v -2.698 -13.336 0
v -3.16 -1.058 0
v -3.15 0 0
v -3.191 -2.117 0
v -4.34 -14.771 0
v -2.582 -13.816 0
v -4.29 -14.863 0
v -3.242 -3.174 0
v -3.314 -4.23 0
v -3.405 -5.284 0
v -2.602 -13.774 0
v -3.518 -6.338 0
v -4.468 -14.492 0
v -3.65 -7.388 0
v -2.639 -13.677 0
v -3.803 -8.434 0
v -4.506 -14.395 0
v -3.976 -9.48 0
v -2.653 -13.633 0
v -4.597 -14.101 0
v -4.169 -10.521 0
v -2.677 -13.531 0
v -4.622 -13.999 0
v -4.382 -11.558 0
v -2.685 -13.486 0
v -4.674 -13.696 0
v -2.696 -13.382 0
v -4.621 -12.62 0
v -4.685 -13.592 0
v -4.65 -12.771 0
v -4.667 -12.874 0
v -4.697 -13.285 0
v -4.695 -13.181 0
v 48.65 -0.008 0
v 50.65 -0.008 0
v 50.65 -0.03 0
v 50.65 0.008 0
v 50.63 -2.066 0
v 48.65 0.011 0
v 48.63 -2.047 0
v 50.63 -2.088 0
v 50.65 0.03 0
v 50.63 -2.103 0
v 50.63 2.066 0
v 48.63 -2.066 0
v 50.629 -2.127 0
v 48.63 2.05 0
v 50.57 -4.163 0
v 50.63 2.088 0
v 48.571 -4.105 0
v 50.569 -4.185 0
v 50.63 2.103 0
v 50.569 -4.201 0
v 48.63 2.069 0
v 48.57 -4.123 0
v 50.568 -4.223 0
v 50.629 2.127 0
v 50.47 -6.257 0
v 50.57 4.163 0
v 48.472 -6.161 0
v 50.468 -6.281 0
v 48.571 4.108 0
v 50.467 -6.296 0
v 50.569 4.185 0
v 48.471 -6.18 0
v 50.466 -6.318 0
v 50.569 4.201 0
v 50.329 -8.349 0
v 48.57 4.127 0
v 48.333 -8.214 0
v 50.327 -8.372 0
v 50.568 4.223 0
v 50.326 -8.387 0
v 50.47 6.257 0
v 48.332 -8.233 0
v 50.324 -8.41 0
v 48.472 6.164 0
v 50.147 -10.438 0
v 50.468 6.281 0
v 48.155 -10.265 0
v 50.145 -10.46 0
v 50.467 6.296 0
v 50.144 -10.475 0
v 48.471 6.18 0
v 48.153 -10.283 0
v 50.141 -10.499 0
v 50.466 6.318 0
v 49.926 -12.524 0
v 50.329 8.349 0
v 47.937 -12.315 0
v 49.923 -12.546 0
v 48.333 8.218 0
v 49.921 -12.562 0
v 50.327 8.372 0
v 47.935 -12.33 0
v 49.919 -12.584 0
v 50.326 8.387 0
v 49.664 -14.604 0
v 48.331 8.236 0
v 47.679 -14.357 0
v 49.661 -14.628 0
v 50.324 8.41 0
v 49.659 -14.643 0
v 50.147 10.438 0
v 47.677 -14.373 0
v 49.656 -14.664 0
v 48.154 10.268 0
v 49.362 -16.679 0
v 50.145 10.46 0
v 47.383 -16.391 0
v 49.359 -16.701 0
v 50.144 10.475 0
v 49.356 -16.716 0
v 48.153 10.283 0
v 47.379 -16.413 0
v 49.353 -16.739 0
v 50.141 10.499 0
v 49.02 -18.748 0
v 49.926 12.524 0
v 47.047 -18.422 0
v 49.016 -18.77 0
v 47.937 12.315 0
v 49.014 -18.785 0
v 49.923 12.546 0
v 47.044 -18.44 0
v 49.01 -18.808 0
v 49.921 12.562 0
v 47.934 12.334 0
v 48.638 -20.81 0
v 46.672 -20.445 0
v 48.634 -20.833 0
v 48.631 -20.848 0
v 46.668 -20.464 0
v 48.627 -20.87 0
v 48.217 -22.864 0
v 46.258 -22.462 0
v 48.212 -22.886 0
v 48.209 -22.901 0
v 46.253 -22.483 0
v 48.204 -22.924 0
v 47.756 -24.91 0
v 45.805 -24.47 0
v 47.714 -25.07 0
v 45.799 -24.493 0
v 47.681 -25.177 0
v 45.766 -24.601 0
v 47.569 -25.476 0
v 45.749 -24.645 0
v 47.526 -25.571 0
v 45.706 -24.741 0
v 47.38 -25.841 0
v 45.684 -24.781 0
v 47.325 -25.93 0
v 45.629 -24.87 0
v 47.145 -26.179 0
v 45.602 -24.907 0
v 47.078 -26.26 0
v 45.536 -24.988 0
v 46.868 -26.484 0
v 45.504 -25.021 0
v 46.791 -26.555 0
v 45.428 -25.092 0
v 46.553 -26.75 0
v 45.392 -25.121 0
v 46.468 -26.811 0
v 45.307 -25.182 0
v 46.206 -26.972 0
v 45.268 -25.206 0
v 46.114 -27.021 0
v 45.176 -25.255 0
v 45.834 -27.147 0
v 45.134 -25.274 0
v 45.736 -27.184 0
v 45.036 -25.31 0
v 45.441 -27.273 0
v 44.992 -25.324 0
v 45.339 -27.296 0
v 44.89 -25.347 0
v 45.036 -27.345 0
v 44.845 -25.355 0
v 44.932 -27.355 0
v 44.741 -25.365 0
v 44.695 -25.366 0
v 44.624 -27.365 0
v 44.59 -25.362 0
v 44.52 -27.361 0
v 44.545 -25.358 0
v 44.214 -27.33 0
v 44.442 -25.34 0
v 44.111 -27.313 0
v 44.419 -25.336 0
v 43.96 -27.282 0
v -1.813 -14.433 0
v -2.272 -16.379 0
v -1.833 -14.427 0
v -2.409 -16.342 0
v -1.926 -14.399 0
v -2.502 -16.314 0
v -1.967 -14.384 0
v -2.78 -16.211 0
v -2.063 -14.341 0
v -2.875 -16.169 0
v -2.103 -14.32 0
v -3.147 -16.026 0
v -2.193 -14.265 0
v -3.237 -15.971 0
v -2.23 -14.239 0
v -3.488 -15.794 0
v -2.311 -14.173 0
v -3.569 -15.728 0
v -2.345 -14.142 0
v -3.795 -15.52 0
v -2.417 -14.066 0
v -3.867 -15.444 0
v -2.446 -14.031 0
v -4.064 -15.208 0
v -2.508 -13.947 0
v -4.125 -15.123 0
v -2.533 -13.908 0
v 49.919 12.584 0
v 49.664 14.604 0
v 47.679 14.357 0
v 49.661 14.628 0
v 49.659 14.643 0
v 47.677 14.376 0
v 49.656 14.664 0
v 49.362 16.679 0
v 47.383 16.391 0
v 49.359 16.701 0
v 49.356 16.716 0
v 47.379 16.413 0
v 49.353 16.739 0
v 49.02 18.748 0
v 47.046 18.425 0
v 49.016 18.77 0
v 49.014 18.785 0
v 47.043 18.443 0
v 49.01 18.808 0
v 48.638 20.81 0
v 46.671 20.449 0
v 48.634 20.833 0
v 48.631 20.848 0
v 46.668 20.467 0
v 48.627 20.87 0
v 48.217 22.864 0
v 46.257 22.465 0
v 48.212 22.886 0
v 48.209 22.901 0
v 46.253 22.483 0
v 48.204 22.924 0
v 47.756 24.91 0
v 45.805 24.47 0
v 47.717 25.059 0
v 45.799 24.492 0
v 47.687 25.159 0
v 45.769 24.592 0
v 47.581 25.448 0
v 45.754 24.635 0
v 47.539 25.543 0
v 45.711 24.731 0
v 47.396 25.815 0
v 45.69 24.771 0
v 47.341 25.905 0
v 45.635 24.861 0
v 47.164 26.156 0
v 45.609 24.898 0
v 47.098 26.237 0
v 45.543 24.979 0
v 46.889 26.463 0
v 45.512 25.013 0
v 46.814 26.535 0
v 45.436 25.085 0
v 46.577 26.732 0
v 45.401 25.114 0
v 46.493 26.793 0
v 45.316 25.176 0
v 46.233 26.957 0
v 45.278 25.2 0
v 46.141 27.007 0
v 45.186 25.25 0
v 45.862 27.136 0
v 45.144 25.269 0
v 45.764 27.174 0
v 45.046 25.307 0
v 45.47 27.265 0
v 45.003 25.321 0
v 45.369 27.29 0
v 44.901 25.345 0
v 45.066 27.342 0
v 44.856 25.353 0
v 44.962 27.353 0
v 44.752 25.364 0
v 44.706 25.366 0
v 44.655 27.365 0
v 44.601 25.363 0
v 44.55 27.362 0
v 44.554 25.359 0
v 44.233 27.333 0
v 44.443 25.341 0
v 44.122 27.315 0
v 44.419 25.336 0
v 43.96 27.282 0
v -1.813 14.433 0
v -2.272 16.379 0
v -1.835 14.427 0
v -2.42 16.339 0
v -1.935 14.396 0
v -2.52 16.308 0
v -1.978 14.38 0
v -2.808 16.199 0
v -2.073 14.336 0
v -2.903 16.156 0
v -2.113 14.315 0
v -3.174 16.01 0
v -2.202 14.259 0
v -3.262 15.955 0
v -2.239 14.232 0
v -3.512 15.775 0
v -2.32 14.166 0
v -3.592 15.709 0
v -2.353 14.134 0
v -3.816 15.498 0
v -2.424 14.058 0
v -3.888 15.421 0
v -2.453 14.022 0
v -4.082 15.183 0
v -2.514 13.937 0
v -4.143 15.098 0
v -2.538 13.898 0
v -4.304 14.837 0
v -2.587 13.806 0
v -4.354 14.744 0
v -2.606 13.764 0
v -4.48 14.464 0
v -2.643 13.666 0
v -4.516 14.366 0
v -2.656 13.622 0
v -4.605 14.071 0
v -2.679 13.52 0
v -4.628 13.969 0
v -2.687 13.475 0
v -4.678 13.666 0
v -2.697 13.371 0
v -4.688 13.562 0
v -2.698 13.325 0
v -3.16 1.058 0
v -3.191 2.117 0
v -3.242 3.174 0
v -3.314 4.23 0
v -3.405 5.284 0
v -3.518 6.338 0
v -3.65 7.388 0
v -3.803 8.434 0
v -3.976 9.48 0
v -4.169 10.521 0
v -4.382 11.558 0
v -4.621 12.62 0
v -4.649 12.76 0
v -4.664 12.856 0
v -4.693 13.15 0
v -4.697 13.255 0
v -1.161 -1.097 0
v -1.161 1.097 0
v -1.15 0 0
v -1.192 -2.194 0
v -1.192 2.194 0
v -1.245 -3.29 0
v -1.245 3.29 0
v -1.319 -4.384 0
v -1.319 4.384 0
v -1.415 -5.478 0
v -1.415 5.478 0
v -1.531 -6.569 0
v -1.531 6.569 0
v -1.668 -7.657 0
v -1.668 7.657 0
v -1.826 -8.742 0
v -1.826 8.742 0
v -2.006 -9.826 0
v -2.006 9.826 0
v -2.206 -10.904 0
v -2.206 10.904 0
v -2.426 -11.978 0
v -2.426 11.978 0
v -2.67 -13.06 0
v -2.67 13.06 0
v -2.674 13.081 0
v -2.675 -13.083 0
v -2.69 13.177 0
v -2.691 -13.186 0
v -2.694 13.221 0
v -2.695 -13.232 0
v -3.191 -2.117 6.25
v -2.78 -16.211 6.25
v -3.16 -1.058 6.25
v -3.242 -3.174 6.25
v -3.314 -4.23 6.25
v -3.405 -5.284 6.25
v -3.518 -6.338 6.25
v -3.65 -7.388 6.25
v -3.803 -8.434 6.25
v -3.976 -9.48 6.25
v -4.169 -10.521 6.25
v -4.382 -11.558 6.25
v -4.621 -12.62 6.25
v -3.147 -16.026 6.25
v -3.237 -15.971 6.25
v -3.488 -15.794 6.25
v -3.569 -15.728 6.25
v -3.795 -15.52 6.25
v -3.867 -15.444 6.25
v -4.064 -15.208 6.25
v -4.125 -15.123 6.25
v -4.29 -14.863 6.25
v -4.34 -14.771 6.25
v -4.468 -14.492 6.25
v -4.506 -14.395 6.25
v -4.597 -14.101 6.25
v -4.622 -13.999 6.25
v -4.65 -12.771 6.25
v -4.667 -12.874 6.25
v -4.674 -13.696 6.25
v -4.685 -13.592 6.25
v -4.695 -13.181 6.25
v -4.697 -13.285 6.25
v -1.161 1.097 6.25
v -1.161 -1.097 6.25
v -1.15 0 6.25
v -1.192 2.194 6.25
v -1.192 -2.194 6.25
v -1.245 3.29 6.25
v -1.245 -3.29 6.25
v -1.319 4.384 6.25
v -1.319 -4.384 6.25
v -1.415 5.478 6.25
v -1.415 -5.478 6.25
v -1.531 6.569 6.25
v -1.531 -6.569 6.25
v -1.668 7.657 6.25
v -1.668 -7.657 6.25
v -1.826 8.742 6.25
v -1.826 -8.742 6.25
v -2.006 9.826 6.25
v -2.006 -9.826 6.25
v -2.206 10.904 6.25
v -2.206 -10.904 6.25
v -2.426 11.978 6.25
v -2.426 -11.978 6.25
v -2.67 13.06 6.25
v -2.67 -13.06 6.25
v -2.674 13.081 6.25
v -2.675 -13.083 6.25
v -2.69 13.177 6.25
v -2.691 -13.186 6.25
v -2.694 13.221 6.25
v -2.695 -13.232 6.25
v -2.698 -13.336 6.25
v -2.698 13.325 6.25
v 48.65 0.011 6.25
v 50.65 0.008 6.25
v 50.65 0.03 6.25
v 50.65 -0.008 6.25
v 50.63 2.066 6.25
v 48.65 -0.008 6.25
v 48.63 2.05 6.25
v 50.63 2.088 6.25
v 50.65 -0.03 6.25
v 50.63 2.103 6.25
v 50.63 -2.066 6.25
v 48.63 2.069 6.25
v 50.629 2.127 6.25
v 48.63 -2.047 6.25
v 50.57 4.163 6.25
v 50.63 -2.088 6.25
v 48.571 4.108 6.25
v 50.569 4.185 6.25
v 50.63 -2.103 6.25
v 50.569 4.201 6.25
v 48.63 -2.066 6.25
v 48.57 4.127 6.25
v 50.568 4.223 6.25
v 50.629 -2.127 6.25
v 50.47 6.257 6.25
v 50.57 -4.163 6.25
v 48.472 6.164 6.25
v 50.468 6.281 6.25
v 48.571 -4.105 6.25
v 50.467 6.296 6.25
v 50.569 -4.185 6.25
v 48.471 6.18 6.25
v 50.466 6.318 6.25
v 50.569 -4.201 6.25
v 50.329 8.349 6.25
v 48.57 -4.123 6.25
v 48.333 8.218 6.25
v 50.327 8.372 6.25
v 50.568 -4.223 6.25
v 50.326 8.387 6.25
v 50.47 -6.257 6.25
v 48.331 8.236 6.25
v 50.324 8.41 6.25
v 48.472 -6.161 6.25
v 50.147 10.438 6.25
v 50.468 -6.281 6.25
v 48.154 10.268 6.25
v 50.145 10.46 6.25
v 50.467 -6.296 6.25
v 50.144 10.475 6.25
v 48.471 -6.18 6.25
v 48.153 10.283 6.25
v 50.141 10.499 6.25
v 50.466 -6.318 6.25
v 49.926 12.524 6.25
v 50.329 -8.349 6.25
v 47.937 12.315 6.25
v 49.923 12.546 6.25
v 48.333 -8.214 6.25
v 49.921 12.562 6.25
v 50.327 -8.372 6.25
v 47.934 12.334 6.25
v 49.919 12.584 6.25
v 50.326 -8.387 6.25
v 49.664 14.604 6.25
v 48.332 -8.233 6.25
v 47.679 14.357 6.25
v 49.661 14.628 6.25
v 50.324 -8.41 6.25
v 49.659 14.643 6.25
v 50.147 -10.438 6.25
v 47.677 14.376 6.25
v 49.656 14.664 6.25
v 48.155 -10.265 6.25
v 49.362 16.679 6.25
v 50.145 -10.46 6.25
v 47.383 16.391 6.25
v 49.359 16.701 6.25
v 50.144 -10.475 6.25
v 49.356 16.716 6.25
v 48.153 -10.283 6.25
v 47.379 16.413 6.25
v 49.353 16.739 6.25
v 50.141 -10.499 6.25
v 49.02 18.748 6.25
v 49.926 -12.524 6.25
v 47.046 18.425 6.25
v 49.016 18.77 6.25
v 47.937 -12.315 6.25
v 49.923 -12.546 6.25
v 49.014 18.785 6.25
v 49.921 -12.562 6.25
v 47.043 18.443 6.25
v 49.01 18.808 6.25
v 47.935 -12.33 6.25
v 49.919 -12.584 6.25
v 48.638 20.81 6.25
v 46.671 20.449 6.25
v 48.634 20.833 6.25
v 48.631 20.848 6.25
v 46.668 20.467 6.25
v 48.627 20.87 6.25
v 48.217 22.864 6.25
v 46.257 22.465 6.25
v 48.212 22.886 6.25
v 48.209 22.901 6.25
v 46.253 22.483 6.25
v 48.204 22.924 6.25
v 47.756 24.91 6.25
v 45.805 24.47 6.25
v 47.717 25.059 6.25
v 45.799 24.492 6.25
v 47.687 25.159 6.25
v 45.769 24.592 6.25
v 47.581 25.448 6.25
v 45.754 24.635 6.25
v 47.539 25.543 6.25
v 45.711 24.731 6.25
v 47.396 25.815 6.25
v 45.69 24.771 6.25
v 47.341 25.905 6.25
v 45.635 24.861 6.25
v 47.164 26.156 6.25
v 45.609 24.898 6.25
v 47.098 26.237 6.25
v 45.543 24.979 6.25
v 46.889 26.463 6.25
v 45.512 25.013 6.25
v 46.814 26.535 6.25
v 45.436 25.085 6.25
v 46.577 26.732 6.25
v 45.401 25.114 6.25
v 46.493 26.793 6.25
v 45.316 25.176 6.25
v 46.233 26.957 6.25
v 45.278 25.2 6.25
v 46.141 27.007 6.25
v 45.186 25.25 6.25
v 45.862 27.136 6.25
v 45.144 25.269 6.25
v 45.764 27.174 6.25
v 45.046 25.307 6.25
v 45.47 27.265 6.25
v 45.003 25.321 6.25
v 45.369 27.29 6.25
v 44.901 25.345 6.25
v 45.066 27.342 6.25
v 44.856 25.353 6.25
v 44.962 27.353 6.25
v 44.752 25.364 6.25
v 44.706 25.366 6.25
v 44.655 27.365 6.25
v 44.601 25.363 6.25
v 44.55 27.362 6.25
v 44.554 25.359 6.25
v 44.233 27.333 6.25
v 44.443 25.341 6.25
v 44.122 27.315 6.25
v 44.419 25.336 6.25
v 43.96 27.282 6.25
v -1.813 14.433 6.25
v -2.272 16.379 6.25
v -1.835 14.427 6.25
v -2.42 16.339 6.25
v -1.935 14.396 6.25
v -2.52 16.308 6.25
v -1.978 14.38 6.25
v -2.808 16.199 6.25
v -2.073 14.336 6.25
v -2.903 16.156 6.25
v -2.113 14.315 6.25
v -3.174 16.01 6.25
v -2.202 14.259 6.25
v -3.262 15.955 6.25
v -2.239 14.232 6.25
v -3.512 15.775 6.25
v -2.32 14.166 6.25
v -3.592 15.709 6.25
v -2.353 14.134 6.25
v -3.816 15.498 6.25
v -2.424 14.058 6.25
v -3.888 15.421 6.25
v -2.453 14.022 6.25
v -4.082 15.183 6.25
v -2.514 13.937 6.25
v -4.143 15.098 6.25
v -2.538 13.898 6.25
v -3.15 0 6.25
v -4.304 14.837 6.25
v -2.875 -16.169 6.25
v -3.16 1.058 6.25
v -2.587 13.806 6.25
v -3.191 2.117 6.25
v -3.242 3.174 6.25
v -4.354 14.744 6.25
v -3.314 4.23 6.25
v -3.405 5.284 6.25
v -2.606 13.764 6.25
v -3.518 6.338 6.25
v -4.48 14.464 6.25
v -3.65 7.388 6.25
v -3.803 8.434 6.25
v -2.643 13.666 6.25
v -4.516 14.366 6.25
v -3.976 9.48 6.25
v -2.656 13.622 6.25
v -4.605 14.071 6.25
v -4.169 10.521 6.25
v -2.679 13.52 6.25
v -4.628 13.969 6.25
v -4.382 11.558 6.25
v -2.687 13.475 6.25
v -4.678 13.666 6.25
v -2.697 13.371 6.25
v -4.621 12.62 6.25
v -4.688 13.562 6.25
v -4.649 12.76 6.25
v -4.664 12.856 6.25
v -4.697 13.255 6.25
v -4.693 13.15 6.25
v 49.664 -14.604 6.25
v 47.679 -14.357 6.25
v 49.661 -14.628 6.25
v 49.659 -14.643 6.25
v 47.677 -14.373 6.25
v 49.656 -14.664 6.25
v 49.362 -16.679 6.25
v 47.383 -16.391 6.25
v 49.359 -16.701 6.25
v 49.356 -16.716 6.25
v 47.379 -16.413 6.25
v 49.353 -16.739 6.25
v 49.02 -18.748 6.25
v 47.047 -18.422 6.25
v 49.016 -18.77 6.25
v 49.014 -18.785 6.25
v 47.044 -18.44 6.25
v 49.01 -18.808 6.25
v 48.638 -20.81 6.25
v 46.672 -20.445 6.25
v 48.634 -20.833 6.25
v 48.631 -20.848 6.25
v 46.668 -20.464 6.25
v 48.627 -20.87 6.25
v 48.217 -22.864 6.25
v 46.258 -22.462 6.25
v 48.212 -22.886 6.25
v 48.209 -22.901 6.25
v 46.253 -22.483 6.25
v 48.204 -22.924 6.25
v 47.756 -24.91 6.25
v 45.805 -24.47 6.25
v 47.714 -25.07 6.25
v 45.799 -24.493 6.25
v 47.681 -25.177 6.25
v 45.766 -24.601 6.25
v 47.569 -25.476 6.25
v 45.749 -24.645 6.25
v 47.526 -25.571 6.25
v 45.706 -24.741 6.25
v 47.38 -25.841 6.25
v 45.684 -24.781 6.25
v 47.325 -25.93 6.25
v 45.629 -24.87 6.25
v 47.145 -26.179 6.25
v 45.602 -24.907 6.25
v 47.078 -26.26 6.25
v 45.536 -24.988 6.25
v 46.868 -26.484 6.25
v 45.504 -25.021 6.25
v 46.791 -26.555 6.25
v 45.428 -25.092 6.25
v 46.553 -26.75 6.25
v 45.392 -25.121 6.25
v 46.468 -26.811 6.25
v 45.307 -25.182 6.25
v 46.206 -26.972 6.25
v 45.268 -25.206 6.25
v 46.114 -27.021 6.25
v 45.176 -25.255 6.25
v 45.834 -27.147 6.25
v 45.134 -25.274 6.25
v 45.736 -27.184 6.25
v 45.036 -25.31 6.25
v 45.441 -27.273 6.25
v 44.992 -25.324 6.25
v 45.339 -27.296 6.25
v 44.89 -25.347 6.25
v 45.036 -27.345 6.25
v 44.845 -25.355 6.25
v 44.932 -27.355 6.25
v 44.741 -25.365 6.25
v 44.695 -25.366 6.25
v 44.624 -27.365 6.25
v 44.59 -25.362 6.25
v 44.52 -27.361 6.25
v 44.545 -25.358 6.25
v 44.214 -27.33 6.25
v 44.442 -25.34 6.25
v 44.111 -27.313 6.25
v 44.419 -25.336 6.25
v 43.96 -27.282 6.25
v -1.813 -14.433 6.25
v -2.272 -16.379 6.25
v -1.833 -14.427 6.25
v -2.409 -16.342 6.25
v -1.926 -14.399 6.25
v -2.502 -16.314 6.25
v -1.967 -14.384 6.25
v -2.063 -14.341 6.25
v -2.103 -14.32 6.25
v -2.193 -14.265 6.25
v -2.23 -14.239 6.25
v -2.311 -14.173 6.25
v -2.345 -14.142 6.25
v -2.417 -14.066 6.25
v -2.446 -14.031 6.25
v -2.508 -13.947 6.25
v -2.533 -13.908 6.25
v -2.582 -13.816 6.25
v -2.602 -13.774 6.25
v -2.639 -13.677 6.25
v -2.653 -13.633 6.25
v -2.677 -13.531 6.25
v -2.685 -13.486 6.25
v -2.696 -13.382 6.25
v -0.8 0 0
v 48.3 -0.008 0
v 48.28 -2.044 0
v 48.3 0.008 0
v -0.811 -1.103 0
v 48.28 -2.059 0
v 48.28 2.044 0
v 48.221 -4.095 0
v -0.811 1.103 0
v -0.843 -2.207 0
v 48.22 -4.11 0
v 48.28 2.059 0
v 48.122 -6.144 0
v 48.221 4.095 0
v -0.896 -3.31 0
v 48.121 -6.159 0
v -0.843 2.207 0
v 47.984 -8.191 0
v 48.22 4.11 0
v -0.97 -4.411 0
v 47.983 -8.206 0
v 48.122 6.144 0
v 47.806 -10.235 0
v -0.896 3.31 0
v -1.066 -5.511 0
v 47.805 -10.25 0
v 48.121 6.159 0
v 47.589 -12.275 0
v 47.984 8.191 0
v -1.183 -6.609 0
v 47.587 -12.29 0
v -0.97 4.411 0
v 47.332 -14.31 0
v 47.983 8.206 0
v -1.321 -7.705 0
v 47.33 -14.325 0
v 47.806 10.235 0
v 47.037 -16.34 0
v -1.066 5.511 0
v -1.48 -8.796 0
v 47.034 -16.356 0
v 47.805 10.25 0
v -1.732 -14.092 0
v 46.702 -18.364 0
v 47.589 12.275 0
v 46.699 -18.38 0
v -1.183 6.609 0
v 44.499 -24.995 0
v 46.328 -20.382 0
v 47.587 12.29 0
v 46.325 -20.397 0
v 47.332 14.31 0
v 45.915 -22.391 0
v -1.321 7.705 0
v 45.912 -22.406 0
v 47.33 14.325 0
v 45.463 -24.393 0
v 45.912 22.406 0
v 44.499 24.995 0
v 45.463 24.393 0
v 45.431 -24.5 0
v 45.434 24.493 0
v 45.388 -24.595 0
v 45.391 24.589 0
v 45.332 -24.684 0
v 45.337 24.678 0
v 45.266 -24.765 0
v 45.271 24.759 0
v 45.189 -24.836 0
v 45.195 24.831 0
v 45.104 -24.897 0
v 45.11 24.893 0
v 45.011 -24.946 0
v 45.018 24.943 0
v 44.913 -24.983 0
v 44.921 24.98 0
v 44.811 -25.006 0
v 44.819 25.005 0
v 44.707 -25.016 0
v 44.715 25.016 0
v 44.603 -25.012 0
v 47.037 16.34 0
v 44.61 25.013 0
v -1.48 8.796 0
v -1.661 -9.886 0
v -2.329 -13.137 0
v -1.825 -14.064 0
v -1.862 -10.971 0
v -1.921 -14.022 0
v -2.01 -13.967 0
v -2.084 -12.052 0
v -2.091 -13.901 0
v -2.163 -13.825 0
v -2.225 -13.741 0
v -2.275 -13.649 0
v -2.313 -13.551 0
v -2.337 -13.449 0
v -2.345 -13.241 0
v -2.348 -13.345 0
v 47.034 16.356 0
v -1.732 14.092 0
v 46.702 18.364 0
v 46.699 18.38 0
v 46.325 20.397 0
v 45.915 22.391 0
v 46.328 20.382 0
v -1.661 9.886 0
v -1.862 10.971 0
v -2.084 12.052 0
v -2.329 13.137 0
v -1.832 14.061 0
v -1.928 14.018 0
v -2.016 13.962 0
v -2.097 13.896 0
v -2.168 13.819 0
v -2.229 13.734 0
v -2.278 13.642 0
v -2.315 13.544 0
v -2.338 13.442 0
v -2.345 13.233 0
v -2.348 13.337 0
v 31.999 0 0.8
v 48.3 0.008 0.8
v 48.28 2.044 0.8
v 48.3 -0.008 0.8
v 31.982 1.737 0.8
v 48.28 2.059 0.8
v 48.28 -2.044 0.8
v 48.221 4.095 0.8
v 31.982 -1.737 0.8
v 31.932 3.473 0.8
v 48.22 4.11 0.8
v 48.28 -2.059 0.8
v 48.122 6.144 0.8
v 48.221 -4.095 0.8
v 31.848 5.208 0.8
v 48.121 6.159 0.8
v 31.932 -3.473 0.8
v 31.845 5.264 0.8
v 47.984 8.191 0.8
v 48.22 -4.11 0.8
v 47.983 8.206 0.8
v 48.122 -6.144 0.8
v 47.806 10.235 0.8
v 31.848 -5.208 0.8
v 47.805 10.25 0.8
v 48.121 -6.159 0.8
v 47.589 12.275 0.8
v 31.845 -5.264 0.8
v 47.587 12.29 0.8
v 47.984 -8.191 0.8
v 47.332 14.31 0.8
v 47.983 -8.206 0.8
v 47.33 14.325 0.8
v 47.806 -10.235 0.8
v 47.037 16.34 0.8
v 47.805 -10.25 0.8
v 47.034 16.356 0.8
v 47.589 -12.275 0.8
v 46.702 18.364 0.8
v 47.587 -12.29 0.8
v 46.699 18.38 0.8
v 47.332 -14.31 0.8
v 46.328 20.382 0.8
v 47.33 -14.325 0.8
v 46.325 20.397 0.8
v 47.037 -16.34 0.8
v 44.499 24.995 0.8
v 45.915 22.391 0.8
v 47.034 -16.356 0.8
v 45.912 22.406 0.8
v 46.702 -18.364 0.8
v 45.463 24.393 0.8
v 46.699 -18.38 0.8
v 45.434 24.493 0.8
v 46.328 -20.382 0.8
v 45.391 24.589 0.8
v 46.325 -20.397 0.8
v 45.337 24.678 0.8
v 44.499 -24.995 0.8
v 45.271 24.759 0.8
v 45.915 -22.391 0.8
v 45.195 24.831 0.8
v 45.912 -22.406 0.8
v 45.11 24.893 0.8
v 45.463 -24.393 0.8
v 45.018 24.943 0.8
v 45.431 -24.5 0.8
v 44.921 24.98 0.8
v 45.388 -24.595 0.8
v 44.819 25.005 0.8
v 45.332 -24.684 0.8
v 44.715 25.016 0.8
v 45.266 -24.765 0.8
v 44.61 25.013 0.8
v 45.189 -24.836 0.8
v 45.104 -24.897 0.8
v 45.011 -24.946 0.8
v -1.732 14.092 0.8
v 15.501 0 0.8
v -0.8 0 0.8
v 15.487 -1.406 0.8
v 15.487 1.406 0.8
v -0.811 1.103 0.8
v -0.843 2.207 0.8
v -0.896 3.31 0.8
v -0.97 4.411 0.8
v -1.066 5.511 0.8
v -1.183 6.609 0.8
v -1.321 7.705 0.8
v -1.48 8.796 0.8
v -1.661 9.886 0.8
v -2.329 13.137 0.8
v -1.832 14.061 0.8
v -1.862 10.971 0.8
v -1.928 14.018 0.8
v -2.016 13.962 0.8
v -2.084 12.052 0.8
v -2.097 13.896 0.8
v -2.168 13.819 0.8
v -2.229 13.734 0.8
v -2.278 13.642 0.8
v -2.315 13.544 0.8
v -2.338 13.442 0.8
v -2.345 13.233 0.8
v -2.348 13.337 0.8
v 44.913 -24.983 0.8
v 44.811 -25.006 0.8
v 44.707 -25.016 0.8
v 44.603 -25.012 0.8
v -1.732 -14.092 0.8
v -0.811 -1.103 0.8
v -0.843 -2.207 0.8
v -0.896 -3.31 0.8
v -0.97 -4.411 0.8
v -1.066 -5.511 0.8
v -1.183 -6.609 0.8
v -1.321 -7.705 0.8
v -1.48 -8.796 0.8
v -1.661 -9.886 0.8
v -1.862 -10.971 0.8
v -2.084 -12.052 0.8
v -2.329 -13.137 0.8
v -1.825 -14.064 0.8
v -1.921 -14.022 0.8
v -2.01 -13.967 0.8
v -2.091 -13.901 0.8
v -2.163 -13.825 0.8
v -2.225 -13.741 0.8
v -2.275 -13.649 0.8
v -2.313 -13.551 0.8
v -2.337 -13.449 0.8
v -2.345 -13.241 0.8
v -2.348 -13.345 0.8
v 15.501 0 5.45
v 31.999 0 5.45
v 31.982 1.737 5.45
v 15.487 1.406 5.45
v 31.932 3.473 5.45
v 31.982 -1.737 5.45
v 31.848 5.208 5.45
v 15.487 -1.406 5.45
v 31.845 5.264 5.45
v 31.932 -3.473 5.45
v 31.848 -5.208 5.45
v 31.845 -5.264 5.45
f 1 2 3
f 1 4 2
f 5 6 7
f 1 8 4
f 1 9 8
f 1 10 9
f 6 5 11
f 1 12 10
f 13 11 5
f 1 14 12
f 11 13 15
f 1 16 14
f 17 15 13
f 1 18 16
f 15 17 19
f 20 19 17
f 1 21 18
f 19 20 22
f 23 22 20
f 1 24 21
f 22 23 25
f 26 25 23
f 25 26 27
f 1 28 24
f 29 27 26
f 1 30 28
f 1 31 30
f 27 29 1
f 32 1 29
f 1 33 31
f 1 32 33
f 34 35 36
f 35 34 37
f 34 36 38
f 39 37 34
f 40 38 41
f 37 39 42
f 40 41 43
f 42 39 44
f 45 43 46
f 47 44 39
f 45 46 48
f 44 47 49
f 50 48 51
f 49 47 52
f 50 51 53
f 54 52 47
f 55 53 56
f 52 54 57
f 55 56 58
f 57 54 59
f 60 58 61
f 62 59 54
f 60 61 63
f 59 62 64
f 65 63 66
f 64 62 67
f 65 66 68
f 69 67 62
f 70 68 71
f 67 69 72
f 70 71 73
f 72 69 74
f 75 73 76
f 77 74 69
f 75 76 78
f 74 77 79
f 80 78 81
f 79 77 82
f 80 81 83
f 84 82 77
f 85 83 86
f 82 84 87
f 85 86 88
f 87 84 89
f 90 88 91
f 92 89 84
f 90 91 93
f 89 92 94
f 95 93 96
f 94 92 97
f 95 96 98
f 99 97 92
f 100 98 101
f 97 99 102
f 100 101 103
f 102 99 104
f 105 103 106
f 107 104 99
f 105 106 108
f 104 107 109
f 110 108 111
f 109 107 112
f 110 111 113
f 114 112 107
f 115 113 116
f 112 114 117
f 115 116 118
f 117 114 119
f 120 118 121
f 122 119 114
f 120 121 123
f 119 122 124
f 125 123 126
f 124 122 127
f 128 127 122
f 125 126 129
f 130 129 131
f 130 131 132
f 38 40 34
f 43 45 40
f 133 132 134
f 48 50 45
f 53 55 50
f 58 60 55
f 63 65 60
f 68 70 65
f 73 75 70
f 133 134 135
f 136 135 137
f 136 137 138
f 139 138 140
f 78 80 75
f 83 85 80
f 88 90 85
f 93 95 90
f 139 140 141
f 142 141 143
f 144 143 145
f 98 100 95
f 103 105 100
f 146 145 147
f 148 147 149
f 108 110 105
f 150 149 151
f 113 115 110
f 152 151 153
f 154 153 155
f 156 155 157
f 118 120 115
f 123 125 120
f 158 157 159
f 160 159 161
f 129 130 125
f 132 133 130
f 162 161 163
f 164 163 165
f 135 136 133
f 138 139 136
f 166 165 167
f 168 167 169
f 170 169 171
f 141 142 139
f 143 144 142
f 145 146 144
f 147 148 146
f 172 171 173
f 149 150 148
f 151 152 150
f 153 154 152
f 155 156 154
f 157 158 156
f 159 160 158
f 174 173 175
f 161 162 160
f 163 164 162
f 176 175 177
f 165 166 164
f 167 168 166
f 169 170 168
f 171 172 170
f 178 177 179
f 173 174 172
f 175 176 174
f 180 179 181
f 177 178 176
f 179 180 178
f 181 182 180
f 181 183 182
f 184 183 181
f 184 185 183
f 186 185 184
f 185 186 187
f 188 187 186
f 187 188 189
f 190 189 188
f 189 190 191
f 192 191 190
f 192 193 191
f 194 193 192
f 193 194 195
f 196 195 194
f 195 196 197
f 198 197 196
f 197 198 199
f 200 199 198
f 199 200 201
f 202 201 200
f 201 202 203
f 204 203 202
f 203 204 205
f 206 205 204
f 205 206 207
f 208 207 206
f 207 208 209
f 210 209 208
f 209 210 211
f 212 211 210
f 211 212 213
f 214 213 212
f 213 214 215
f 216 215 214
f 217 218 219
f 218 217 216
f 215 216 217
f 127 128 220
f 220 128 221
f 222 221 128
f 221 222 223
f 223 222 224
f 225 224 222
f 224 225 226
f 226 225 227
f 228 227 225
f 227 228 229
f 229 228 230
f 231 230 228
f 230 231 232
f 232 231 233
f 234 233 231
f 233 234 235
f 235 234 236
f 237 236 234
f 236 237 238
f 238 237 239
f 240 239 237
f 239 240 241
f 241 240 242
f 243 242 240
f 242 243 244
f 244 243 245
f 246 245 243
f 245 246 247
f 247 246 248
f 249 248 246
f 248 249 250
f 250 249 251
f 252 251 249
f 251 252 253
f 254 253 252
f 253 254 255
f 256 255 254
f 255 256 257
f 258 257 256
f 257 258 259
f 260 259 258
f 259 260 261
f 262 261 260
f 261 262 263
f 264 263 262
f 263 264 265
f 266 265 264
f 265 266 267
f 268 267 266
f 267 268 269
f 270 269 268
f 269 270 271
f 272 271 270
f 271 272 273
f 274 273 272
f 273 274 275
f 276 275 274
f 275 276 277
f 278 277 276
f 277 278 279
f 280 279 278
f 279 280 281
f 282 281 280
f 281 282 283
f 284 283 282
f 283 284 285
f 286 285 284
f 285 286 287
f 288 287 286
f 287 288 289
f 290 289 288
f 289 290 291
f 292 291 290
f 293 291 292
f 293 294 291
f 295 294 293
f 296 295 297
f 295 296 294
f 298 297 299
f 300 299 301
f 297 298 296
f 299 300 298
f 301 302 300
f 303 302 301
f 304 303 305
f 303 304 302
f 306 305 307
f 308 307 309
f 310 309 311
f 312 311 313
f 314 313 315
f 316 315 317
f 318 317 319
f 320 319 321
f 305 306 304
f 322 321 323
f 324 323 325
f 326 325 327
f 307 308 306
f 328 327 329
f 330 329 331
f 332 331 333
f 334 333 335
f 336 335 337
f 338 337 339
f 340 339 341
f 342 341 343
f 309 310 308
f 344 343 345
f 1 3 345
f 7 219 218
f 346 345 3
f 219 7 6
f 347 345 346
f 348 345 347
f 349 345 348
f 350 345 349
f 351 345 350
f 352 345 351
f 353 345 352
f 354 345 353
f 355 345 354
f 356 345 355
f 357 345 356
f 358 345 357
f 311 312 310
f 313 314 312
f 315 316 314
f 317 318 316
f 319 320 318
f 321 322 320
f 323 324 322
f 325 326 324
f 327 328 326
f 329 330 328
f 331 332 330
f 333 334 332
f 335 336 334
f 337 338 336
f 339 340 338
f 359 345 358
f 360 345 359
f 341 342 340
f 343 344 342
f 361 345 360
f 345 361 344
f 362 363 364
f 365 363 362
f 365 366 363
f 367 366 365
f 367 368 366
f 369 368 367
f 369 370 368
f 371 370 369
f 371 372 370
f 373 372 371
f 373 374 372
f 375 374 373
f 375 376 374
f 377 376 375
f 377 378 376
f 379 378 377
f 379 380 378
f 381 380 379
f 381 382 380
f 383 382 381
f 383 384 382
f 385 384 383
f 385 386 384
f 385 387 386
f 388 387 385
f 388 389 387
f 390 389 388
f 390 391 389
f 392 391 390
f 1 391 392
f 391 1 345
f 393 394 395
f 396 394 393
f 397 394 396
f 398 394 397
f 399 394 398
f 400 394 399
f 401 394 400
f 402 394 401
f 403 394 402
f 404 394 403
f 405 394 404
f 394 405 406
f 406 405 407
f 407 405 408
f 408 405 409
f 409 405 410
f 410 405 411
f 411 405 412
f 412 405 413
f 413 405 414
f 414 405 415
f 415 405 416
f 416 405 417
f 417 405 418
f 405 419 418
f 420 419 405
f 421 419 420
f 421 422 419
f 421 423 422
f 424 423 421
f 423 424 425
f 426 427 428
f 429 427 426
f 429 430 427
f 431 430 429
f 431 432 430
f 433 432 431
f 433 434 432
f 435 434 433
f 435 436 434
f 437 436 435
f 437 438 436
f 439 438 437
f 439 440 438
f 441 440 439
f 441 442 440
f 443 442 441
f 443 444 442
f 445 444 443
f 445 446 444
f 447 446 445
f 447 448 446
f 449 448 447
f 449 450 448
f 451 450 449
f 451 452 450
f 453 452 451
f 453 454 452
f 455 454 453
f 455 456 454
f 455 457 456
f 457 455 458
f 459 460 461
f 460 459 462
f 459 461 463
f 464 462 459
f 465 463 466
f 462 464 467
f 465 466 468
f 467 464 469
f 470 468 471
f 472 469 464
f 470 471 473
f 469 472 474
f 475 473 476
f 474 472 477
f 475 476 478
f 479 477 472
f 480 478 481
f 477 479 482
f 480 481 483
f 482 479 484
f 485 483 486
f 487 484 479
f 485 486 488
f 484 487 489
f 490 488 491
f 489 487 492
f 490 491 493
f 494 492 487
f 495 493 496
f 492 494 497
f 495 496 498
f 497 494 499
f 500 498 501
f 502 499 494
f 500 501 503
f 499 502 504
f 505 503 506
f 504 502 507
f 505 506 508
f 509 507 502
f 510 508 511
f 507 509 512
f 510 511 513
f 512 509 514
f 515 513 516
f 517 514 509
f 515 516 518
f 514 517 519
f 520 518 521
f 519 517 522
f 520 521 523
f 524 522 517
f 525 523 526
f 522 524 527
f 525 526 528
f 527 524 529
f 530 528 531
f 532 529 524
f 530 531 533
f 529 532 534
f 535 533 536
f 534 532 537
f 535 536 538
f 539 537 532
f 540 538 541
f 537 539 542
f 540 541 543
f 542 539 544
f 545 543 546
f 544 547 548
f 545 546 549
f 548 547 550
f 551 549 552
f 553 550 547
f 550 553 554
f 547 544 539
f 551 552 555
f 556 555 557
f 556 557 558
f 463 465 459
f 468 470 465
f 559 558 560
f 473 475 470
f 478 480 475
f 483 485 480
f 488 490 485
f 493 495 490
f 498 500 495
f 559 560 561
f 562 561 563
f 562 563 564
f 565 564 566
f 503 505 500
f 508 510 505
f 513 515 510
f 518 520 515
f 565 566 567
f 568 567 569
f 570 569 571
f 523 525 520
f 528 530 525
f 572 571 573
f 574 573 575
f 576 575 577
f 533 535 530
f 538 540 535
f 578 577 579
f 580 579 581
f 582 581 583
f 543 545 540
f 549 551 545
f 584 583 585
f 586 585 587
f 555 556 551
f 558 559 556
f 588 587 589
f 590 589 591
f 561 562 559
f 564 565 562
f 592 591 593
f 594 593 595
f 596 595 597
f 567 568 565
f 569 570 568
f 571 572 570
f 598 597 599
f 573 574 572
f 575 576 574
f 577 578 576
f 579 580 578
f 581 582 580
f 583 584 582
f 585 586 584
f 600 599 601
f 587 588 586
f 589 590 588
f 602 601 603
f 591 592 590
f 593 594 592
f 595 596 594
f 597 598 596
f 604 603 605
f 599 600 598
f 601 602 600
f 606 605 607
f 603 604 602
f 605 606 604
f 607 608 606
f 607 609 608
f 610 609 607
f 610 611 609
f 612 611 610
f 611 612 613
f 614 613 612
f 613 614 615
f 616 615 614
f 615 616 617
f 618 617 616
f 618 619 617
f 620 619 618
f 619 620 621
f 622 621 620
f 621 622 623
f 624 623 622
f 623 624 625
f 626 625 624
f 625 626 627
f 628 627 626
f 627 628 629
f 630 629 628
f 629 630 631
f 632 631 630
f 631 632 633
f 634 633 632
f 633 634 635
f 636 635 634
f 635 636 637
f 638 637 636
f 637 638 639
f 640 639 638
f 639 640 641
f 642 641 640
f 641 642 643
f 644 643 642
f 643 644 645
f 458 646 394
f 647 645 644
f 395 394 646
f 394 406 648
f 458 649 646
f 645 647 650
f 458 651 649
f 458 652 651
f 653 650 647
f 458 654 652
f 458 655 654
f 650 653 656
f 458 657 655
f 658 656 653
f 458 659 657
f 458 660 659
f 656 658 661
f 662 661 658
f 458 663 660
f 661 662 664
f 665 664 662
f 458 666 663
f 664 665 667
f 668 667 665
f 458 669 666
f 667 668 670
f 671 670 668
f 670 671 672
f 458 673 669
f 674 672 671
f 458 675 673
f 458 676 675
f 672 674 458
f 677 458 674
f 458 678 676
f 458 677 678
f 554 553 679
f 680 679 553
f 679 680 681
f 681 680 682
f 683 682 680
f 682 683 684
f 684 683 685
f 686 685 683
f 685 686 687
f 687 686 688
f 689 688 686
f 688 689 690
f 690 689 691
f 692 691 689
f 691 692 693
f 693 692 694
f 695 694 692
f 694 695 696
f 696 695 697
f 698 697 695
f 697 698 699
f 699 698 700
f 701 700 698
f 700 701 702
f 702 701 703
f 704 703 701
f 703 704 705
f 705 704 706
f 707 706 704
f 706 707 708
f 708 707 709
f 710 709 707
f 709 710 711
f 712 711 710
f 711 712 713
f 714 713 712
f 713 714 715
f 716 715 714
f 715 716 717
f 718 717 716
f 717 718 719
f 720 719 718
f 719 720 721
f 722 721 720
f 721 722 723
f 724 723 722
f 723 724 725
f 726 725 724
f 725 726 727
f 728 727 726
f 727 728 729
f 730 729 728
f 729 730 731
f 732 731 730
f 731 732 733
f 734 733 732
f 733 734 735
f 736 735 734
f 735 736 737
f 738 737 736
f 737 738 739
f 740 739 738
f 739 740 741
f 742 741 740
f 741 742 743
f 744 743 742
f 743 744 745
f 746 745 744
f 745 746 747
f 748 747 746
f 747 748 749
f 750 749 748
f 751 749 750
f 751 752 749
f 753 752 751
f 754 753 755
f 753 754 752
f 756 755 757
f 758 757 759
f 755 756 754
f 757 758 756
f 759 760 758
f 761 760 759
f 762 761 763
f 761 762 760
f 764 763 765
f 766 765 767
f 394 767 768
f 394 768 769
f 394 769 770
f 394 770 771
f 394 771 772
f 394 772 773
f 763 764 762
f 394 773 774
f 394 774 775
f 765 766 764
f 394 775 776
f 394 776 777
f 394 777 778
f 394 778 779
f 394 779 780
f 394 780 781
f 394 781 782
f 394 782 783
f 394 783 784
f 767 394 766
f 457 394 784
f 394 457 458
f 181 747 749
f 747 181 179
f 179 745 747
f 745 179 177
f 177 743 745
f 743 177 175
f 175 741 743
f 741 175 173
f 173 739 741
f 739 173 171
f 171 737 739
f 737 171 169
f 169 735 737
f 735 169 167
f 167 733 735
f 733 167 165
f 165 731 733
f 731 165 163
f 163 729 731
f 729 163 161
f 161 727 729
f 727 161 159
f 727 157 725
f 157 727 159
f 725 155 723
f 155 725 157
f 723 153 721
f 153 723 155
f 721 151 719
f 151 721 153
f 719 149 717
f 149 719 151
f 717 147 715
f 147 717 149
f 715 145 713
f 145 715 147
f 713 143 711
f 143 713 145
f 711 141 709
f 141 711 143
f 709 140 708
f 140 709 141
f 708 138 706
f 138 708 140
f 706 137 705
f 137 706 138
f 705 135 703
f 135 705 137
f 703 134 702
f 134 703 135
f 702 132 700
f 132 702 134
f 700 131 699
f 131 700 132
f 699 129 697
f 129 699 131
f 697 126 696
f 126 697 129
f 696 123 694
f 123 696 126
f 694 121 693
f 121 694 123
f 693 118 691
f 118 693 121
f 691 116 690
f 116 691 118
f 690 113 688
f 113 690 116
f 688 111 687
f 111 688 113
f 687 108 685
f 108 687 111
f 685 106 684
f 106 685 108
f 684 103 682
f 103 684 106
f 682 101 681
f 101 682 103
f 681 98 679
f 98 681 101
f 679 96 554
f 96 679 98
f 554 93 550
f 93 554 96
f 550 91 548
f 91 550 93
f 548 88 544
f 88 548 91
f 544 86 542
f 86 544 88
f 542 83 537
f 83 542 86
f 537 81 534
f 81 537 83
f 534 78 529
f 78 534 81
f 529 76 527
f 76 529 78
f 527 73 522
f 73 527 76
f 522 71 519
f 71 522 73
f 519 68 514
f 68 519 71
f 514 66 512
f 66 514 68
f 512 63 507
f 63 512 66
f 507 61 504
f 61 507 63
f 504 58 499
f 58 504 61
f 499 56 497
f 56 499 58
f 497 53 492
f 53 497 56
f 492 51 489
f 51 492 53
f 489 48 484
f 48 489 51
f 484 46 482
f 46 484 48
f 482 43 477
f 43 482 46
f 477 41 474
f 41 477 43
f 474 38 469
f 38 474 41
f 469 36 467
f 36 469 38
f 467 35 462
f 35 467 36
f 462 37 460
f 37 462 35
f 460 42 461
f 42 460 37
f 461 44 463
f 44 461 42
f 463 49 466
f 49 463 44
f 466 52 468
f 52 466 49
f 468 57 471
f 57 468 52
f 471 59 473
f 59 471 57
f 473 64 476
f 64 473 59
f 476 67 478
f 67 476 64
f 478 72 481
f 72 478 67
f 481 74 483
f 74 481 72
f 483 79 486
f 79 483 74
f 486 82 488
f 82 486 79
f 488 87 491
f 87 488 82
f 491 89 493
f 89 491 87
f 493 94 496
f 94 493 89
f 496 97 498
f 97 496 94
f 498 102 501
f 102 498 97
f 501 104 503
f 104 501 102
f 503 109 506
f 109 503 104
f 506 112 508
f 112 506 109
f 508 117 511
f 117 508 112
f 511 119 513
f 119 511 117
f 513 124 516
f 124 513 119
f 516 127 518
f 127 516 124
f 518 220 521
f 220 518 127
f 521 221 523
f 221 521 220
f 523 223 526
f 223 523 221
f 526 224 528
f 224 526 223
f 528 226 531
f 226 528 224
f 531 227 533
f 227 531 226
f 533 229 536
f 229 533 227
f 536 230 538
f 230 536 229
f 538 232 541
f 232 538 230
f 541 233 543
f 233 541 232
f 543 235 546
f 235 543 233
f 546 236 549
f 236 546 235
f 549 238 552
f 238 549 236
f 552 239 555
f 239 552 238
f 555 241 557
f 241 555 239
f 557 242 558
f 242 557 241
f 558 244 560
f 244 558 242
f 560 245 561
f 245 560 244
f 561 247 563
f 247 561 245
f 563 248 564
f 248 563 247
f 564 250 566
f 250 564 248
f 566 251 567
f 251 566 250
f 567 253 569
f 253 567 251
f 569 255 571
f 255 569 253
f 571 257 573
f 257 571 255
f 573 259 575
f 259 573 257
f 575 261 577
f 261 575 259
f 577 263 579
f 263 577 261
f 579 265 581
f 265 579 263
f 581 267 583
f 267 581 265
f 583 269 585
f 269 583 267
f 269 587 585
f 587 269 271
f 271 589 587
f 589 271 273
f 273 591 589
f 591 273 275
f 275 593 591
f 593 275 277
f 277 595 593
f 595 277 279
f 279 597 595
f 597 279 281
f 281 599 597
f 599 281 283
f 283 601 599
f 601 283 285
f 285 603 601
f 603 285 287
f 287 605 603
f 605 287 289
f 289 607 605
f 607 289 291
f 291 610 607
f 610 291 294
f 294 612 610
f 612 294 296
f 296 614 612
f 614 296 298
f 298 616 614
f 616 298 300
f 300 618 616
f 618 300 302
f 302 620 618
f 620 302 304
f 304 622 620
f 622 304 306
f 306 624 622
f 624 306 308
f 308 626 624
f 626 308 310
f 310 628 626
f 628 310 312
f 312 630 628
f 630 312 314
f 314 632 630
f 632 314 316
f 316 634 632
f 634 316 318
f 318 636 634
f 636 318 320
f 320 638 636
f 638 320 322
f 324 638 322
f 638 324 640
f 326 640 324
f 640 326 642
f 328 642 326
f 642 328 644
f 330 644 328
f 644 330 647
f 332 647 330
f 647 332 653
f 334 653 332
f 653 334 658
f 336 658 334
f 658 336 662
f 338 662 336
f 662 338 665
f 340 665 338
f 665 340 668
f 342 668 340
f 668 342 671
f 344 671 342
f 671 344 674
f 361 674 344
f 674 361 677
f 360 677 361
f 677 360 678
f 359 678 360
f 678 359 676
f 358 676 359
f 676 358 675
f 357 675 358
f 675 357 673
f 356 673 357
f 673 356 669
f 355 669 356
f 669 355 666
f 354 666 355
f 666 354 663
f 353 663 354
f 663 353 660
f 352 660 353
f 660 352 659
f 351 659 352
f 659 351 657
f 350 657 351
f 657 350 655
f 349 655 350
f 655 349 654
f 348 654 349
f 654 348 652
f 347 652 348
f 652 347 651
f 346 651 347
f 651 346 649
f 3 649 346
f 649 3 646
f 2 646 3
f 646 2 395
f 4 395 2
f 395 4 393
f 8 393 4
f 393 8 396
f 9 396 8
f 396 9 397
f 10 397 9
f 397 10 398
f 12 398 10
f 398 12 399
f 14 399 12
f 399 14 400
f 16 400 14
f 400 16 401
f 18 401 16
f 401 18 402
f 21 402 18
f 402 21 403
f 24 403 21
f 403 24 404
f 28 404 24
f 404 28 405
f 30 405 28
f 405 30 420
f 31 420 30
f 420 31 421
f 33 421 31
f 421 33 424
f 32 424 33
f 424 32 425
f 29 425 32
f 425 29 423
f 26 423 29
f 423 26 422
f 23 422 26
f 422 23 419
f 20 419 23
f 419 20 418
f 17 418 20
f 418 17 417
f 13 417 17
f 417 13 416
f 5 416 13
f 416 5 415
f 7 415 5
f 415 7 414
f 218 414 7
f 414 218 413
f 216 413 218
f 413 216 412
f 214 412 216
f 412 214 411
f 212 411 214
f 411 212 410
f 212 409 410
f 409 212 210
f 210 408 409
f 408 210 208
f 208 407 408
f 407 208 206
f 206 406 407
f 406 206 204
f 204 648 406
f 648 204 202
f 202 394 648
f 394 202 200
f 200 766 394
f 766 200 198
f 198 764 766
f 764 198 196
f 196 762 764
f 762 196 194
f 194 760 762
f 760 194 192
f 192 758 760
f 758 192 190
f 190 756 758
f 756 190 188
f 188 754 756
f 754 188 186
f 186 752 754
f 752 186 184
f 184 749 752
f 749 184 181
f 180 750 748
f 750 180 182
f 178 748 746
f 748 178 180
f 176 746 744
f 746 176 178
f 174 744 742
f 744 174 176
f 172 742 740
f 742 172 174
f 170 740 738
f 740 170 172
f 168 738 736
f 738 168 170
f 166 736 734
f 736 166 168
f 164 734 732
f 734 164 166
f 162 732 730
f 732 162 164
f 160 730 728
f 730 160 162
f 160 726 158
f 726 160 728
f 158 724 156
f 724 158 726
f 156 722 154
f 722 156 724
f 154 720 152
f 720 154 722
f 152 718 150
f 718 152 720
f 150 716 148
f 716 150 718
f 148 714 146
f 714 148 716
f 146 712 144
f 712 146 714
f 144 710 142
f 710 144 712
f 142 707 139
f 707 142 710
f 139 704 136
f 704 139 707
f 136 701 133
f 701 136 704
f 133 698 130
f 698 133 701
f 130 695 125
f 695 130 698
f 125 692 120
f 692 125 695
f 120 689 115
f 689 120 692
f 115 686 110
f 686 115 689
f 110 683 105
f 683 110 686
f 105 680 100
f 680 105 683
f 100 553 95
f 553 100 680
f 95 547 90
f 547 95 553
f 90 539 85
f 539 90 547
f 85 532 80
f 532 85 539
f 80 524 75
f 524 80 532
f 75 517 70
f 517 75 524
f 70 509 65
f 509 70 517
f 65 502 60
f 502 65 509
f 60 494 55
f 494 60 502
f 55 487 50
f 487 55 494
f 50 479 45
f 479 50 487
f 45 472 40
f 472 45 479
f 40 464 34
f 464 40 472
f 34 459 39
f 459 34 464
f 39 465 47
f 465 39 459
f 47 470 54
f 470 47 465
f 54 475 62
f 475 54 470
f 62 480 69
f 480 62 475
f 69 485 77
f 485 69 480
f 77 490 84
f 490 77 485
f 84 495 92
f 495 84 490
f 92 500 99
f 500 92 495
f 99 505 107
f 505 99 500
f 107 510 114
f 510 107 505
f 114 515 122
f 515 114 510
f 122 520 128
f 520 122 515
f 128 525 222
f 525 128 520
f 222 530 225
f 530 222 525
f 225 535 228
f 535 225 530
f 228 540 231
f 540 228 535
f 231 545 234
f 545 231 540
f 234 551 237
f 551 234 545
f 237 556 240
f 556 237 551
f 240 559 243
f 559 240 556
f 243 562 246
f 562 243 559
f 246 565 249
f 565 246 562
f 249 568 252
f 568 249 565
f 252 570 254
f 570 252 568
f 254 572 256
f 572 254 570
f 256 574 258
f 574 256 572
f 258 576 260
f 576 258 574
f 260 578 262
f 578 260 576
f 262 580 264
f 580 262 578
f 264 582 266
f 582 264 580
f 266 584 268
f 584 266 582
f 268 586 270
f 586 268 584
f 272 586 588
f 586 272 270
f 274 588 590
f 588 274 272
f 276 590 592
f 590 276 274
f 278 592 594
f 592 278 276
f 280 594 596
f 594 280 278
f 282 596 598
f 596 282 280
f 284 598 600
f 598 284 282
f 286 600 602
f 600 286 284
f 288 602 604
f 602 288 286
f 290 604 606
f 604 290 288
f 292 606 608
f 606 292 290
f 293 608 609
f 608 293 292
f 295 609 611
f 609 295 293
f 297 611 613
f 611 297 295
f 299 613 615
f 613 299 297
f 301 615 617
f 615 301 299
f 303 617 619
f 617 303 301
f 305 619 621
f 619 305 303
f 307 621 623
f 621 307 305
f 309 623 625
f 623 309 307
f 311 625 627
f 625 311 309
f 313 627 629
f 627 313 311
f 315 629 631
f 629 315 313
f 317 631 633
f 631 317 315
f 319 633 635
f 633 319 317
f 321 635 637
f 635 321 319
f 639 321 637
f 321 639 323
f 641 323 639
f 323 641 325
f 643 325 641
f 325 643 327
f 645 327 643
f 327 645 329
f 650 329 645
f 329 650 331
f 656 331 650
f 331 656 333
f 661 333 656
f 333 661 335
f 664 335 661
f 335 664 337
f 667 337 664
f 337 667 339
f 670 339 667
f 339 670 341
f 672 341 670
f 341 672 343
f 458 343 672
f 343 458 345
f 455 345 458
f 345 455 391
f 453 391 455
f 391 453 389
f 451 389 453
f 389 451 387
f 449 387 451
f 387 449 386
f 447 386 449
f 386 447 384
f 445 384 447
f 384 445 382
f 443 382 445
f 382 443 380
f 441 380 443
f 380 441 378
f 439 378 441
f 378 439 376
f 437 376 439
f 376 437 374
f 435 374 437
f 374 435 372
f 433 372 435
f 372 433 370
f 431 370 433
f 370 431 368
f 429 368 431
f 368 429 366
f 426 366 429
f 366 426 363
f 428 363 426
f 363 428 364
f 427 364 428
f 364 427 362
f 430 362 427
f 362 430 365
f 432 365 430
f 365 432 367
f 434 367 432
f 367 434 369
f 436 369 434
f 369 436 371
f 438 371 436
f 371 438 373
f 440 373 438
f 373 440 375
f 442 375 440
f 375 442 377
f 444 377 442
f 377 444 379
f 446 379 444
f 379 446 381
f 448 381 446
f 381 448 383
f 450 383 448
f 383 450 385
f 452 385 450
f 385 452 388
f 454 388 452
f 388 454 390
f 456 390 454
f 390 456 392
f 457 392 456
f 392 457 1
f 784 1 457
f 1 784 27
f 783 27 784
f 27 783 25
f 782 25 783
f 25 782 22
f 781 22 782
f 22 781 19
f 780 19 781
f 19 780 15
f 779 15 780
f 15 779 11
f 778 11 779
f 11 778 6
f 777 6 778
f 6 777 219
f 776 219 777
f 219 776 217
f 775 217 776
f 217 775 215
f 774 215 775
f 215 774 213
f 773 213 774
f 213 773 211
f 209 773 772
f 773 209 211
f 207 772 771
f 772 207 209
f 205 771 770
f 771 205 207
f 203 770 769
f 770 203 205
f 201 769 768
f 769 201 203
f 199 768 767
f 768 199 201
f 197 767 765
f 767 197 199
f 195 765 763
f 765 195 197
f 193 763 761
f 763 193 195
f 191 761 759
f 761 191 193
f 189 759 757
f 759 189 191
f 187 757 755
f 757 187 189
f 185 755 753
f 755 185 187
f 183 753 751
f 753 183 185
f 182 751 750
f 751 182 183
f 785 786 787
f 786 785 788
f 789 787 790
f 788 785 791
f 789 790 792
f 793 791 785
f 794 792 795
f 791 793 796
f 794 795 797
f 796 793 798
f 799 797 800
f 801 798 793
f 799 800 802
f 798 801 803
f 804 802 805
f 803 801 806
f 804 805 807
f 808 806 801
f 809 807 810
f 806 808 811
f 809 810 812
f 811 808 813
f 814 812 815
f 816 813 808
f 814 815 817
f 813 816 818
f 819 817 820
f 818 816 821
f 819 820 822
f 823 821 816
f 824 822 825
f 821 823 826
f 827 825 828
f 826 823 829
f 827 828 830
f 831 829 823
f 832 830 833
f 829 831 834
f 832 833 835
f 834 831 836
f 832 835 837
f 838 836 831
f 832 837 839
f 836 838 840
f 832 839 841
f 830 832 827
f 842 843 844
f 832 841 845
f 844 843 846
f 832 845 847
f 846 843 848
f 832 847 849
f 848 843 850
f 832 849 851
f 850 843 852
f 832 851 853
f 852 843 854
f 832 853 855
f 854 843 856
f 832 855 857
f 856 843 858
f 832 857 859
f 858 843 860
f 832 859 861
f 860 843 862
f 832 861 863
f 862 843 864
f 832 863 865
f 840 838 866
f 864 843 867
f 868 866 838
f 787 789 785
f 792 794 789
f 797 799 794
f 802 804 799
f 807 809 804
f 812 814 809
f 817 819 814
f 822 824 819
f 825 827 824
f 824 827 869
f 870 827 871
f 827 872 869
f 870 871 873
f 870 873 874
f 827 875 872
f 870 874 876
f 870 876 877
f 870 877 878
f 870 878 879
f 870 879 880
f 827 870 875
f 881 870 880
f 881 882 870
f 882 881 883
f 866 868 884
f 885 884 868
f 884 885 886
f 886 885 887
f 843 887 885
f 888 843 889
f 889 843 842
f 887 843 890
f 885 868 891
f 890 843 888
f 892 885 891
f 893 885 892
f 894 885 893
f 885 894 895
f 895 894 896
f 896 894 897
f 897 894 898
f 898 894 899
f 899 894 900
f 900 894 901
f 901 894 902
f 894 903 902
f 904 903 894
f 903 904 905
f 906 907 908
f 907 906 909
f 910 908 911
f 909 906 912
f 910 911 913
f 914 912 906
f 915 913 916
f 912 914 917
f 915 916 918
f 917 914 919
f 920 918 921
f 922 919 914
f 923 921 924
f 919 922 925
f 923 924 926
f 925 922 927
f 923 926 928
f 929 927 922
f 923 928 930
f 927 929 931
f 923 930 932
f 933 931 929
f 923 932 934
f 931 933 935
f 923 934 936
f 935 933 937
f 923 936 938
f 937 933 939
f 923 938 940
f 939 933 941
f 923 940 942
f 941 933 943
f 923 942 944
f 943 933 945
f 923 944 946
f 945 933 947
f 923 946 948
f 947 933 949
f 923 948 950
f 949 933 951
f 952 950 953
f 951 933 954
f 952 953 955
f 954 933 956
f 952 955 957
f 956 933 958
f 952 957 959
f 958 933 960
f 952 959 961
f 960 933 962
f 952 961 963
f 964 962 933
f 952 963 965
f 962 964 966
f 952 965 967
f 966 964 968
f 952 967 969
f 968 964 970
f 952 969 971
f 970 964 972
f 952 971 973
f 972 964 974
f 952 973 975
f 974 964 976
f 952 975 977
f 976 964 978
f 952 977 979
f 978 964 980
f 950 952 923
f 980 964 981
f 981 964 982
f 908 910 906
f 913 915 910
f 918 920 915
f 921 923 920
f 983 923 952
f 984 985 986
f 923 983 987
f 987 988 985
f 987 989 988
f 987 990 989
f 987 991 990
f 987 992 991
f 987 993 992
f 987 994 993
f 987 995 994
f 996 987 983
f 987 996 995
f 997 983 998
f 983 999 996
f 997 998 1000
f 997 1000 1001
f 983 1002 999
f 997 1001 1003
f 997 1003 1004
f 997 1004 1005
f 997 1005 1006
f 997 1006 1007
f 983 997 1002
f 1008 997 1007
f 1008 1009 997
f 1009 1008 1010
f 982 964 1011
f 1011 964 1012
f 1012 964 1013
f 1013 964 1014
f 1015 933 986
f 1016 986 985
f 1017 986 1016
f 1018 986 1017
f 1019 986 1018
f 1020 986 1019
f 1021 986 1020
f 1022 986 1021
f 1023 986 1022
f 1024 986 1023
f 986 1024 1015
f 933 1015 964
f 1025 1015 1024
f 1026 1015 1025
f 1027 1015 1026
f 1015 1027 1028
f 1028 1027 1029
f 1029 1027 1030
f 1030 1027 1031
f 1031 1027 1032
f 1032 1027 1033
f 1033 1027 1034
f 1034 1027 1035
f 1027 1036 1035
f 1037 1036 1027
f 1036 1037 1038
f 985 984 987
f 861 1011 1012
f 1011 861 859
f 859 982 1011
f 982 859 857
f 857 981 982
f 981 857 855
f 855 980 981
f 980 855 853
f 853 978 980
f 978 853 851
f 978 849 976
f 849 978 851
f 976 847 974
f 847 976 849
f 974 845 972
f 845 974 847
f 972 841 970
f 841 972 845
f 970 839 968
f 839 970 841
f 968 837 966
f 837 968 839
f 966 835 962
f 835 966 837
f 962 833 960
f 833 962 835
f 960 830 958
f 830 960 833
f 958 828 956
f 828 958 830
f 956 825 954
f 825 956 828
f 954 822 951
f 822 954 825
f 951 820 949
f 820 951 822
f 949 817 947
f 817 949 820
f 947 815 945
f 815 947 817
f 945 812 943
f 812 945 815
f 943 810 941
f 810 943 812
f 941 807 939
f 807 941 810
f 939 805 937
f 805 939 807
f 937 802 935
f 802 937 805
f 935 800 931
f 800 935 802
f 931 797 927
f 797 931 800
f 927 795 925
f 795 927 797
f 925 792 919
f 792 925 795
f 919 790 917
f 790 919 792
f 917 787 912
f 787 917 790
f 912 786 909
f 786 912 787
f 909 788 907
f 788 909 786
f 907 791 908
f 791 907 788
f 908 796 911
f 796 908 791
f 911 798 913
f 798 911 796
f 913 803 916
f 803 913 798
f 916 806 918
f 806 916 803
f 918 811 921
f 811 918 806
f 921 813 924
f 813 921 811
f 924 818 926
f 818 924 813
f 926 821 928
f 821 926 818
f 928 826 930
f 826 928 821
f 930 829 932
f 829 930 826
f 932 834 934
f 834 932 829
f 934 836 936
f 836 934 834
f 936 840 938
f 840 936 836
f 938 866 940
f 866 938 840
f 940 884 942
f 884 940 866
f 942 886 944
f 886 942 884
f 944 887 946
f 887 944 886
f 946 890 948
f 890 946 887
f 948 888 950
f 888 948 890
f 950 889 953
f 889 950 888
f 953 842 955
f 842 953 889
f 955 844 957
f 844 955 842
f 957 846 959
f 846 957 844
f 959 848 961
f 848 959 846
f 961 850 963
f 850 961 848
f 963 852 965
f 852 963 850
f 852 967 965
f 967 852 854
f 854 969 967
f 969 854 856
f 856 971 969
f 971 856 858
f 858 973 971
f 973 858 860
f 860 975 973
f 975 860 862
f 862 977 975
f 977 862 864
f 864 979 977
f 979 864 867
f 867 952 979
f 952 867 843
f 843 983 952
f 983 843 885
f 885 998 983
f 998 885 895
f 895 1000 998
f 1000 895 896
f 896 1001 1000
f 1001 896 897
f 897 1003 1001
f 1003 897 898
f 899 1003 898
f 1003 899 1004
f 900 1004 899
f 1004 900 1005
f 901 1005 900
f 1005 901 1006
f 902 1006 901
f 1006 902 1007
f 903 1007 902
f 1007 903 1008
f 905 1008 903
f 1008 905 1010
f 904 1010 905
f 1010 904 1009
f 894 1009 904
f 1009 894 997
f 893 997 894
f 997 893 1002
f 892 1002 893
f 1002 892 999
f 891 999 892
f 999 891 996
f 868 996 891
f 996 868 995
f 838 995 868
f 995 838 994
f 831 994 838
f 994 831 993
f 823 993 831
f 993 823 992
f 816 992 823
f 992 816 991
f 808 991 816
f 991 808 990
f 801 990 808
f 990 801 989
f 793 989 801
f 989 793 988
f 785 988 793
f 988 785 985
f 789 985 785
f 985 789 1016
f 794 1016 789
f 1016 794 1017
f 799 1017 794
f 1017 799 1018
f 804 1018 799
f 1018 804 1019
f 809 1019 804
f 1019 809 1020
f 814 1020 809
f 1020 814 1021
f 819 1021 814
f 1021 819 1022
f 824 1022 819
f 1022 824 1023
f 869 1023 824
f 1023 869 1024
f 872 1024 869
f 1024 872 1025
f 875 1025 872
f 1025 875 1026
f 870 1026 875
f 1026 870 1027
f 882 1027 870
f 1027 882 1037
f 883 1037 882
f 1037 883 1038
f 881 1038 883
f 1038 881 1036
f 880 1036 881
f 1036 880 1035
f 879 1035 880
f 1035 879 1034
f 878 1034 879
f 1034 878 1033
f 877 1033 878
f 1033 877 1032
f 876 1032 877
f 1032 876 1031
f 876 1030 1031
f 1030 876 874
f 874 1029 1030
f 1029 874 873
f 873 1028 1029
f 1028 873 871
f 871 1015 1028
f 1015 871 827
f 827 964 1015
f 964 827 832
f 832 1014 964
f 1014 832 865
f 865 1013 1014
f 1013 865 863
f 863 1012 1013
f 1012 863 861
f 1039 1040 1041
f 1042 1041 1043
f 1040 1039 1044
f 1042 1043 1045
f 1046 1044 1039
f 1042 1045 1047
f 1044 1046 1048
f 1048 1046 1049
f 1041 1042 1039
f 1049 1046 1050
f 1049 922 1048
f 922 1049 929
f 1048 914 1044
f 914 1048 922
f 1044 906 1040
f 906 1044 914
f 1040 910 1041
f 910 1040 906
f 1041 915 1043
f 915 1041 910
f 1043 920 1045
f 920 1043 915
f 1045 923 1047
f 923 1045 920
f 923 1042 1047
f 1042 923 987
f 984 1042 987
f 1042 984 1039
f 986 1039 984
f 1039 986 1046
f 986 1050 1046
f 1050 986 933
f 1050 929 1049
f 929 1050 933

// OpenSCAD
// Gen-CP — fit coupon (bay part): O20/O5 THROUGH pockets at carrier thickness (test on a steel offcut), 608 seat,
// D-flat bore, gap shim, and one bobbin-bay slice (bobbin footprint + bay_clear) to test former fit.
include <parameters.scad>;
$fn = 48;
// D-flat keyed bore: flat faces +X (angle 0 = magnet pocket 0 = index notch)
module dflat_bore(h) {
    intersection() {
        cylinder(d=shaft_bore, h=h);
        translate([-shaft_bore, -shaft_bore, 0]) cube([shaft_bore + dflat_x, 2*shaft_bore, h]);
    }
}
module sector_2d(r_in, r_out, ang) {
    polygon([
        for (a = [-ang/2 : ang/24 : ang/2]) [r_in*cos(a), r_in*sin(a)],
        for (a = [ang/2 : -ang/24 : -ang/2]) [r_out*cos(a), r_out*sin(a)]
    ]);
}
module footprint_2d() { offset(r=wall) sector_2d(coil_id_r, coil_od_r, span_deg); }
module hub_2d()       { offset(delta=-coil_core_inset) sector_2d(coil_id_r, coil_od_r, span_deg); }

// bay slice at FULL stator thickness with one bobbin BASE printed IN PLACE inside it (bay_clear gap): this is the
// print-in-place test for the one-plate stator. After printing, the base must pop out with finger pressure; if it is fused,
// print coil_former.stl separately (print-packs/parts/) instead of using the in-place bases.
translate([-coil_id_r, 0, 0]) {
    difference() {
        linear_extrude(stator_thick) offset(r=bay_clear + 2) footprint_2d();
        translate([0, 0, -0.1]) linear_extrude(stator_thick + 0.2) offset(r=bay_clear) footprint_2d();
    }
    union() {
        linear_extrude(flange_t) footprint_2d();
        translate([0, 0, flange_t - 0.01]) linear_extrude(former_web + 0.01) hub_2d();
    }
}
